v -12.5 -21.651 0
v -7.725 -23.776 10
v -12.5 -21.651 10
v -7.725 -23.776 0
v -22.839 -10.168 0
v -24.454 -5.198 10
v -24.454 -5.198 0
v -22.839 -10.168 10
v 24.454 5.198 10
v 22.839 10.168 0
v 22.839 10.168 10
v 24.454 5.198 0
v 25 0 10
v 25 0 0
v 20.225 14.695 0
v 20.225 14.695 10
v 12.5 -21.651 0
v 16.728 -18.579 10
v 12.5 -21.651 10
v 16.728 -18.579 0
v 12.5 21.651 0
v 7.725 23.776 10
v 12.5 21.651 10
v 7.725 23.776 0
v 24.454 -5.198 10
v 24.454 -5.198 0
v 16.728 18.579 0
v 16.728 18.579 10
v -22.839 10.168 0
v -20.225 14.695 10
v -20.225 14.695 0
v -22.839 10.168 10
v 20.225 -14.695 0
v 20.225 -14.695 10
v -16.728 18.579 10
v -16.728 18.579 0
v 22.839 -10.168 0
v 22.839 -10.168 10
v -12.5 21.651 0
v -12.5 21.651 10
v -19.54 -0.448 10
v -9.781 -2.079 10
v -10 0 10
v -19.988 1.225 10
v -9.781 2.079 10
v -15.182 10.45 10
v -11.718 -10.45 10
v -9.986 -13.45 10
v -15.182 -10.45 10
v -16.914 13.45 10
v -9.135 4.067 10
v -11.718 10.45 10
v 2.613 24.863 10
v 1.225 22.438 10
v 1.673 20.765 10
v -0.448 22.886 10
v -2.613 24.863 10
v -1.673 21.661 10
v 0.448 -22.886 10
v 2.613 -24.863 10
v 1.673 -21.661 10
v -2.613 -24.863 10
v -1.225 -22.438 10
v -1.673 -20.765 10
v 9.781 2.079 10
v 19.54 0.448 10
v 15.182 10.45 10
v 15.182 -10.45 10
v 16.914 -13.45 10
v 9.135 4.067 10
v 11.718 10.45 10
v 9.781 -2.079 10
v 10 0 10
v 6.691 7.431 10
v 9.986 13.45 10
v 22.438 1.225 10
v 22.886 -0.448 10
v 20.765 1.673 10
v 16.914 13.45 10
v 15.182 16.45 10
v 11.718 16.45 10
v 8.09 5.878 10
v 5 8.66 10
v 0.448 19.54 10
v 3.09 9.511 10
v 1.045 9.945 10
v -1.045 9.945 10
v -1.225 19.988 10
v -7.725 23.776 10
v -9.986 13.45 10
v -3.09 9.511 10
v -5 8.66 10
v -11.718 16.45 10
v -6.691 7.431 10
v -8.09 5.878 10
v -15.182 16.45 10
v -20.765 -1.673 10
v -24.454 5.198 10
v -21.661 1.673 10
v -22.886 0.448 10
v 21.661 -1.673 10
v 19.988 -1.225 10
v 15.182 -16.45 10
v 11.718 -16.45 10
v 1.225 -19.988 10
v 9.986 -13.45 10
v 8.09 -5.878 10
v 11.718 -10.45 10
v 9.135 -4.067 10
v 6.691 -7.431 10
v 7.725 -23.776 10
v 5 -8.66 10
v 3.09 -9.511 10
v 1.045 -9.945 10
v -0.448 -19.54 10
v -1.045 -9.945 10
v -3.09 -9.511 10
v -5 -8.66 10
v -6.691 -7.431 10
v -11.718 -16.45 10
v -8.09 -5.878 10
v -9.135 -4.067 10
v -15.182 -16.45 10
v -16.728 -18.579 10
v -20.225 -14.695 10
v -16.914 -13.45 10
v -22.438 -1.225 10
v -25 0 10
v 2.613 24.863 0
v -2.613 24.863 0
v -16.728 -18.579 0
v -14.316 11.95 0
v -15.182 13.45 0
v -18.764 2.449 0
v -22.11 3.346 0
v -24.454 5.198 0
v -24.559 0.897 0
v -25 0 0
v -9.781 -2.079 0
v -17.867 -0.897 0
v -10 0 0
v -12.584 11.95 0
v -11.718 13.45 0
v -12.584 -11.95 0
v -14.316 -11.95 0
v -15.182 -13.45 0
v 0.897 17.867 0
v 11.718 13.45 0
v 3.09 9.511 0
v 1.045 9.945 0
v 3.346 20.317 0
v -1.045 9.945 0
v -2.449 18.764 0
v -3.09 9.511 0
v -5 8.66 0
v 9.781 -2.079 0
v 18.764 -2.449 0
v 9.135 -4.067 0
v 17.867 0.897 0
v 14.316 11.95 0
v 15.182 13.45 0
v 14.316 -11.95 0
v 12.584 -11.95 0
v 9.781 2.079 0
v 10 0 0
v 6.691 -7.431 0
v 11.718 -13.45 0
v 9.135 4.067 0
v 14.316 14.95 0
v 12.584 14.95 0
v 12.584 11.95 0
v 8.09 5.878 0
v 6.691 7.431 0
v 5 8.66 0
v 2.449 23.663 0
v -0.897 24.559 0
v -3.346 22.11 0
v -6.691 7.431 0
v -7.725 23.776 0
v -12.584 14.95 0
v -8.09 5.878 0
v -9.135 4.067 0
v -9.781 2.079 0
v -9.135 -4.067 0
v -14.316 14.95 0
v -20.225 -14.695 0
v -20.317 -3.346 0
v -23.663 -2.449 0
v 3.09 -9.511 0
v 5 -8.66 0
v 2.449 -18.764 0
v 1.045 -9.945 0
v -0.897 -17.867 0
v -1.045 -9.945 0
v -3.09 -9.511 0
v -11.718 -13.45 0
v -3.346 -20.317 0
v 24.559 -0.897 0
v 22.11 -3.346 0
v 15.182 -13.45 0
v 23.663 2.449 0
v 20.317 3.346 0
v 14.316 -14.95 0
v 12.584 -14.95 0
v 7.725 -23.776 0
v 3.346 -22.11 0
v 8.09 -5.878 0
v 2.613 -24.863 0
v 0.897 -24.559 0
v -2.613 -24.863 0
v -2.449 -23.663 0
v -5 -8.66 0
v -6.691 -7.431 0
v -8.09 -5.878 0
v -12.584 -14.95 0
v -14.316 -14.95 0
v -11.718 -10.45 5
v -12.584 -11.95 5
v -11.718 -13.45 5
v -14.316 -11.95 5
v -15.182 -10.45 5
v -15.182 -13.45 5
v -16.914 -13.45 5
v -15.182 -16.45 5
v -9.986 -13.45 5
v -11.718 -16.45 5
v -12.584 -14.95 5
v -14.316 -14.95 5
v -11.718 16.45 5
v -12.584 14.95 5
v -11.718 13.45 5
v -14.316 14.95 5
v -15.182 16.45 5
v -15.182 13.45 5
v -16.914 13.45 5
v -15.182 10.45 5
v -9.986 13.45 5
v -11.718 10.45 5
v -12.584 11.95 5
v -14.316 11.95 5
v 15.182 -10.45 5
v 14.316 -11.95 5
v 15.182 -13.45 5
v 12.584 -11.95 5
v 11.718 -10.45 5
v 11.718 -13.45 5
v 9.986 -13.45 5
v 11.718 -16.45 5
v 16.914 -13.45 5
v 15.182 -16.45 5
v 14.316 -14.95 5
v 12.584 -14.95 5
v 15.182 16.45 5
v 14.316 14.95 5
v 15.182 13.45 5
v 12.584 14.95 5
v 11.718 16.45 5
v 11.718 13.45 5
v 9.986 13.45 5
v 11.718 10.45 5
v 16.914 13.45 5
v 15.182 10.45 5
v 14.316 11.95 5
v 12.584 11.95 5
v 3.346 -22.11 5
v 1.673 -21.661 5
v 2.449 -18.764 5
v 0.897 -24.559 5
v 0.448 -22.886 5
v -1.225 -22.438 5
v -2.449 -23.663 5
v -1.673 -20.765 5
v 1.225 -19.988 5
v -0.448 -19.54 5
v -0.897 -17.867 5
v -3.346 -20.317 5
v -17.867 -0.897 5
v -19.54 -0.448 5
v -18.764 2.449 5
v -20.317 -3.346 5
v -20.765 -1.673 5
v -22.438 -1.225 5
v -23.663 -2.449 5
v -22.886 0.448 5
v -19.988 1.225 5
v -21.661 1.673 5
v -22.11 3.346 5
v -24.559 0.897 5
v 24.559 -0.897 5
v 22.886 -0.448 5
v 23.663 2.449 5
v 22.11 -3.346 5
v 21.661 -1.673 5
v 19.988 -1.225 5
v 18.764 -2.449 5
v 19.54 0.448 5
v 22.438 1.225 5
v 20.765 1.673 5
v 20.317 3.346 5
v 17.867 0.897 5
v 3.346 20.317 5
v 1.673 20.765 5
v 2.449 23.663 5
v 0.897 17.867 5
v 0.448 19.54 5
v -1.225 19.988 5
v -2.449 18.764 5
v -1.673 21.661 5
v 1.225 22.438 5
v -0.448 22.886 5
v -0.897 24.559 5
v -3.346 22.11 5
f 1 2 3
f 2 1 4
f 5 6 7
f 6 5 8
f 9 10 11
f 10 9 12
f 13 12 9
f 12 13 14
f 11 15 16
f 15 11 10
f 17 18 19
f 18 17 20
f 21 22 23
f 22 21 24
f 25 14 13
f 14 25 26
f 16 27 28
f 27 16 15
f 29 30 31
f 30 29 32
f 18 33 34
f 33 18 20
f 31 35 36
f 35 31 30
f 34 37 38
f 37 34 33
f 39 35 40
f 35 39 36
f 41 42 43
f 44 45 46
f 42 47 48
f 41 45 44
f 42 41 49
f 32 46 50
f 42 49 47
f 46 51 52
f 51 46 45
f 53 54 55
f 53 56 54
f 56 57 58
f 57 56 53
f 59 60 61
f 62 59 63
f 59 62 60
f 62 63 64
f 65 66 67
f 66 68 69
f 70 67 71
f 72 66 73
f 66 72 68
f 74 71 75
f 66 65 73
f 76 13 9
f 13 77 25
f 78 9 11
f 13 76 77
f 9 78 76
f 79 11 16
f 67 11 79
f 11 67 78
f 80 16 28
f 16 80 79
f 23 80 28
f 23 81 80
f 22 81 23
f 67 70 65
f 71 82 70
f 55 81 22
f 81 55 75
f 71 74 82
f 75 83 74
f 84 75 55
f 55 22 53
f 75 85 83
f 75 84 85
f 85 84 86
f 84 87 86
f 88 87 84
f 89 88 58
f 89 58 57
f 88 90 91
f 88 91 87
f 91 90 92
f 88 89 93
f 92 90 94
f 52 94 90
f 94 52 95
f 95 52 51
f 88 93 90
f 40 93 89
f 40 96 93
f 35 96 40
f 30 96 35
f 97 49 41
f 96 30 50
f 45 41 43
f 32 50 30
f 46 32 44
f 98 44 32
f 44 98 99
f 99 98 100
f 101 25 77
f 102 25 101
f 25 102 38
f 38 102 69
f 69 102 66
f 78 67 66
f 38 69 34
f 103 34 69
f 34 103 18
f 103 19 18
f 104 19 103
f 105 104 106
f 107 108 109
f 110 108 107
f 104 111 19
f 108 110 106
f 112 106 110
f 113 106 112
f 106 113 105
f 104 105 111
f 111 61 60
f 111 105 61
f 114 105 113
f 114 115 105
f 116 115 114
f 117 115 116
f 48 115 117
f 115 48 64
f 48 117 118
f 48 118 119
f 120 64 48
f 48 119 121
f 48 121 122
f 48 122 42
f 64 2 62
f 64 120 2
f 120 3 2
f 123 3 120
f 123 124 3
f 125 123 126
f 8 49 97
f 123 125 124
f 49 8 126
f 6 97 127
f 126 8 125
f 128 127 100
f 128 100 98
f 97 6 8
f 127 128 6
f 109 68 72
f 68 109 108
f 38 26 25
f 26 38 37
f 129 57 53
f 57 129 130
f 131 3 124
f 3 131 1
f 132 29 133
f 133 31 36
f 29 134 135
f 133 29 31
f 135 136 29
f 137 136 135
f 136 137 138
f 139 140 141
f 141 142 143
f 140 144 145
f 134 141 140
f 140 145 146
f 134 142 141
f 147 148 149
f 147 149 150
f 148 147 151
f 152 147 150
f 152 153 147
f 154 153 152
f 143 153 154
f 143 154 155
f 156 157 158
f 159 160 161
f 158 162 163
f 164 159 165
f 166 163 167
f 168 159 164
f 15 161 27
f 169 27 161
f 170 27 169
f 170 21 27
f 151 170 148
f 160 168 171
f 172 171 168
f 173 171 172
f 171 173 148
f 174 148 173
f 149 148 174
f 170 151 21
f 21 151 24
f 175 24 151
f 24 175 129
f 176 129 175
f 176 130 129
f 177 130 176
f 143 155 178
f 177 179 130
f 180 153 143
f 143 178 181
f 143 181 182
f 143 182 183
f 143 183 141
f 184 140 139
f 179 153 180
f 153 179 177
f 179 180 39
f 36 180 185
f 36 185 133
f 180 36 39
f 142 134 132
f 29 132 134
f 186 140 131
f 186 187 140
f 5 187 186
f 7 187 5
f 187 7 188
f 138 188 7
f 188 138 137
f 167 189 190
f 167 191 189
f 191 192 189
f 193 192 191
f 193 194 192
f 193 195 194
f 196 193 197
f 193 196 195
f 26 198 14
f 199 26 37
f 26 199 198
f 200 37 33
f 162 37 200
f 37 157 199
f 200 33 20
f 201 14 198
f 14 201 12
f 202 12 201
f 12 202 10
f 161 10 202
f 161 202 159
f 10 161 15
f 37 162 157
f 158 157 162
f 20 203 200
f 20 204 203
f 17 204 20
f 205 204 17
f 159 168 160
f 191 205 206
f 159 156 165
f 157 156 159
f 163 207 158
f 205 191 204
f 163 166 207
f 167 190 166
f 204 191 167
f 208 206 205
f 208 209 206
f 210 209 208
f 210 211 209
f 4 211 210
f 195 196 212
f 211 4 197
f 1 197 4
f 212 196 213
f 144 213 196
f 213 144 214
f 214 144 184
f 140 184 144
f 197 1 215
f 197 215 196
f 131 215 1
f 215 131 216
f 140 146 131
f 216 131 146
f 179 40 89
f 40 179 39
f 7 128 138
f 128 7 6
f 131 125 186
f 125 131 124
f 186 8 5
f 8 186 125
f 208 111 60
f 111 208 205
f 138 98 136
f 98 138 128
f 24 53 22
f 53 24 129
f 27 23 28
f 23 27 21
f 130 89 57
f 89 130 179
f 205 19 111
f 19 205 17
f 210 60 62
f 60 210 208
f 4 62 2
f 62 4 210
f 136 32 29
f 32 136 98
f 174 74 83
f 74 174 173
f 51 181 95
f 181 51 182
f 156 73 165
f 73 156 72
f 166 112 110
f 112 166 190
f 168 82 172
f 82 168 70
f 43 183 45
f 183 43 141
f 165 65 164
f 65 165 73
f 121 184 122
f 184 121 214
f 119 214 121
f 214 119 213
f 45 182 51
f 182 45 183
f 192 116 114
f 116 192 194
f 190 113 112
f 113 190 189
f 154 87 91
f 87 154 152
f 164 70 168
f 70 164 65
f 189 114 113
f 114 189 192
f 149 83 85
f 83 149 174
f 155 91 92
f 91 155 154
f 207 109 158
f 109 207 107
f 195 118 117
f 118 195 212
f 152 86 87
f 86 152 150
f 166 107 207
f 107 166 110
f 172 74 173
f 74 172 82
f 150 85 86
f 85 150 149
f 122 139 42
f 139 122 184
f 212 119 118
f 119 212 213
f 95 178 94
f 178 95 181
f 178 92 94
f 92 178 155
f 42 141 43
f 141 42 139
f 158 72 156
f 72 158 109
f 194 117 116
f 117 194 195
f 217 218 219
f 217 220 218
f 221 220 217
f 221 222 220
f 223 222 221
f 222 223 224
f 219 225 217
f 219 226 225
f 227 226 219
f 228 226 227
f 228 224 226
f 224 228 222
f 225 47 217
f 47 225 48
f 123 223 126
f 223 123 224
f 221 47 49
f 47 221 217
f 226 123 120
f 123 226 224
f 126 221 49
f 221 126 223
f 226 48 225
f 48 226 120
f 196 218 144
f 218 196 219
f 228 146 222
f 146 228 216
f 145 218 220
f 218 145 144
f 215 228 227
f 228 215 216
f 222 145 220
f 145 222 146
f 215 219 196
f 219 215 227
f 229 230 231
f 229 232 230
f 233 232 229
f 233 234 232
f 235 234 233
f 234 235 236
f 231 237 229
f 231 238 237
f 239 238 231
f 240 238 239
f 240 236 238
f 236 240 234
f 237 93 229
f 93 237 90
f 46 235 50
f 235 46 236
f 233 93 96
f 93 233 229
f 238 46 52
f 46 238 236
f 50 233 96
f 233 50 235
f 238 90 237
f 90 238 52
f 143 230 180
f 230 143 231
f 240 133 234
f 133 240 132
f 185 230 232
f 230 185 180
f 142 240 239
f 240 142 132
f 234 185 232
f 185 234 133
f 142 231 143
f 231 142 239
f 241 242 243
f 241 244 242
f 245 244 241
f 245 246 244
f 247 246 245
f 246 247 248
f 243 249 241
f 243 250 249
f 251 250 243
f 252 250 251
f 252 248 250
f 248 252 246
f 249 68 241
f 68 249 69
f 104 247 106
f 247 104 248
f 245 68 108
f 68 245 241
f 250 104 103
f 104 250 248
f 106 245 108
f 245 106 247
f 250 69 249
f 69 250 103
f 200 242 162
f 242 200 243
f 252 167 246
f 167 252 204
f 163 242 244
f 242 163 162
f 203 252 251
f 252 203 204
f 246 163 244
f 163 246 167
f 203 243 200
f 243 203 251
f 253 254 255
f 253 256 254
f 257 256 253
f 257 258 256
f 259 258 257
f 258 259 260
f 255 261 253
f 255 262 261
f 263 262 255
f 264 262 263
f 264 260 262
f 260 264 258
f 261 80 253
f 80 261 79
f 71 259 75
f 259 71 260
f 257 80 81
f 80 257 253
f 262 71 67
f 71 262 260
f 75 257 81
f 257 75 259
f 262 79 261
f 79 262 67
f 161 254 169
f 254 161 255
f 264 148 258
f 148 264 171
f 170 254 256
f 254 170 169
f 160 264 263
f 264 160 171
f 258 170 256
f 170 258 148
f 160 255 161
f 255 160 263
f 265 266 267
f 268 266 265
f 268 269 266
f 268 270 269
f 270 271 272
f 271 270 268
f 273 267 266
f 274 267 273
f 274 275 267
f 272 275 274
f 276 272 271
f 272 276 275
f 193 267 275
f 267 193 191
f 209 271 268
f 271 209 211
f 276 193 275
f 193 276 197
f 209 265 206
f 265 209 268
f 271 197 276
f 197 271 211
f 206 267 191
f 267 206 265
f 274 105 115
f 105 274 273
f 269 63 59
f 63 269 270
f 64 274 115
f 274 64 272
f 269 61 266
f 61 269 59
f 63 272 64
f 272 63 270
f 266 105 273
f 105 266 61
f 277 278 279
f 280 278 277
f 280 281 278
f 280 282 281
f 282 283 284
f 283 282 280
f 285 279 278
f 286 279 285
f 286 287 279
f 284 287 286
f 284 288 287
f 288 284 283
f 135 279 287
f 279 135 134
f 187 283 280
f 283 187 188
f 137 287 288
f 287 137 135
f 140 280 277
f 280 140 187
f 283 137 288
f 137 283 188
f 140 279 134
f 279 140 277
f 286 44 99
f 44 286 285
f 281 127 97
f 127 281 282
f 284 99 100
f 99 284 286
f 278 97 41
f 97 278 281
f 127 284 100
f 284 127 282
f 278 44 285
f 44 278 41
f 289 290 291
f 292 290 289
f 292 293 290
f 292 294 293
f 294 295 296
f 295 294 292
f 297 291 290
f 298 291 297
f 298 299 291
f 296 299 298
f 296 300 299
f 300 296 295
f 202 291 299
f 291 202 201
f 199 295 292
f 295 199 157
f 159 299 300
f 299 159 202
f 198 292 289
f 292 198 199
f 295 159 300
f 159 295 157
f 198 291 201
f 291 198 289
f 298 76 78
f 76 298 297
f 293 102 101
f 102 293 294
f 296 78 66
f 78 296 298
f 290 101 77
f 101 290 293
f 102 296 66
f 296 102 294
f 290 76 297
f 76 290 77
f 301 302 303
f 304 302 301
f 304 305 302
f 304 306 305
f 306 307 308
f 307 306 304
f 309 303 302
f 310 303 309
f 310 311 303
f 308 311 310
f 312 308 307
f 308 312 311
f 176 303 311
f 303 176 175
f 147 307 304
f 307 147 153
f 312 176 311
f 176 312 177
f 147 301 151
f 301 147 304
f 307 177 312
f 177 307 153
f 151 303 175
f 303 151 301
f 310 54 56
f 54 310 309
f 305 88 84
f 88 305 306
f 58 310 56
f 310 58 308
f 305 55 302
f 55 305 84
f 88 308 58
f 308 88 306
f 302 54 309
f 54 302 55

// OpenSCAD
/*
 This creates a size a to size b ring adapter for interoperation of cage parts of different sizes or from different manufacturers
 Counterbores are assumed to be for M3 or 4-40 screws and Rod A counterbores will be easier to print (Rod B counterbores may need supports)
  */

Plate_Thickness = 10;

Outer_Diameter = 50;

//(0 = no thru hole)
Inner_Diameter = 20;

Rod_A_Diameter = 6;

Rod_A_Spacing = 26.9;

Rod_A_Hole_Type = "Counterbore";	//	[Thru, Counterbore]

Rod_B_Diameter = 6;

Rod_B_Spacing = 30;

Rod_B_Hole_Type = "Counterbore";	//	[Thru, Counterbore]

Relative_Angle= 45;//	[0:90]
difference(){
    make_plate ();
    make_rod_a_hole();
    make_rod_b_hole();
}

module make_plate (){
    if (Inner_Diameter == 0) cylinder(h = Plate_Thickness, r = Outer_Diameter/2, Center = false);
    else difference(){
        cylinder(h = Plate_Thickness, r = Outer_Diameter/2, Center = false);
        cylinder(h = Plate_Thickness, r = Inner_Diameter/2, Center = false);
    }
}
module make_rod_a_hole (){
    if (Rod_A_Hole_Type == "Thru")
    { 
        for (x = [-.5,.5], 
        y =[-.5,.5]) translate ([x*Rod_A_Spacing,y*Rod_A_Spacing,Plate_Thickness/2]) make_hex(Rod_A_Diameter,Plate_Thickness);
    }
    else
    { 
        for (x = [-.5,.5], 
        y =[-.5,.5]) translate ([x*Rod_A_Spacing,y*Rod_A_Spacing,Plate_Thickness/4]) make_counter(Rod_A_Diameter,Plate_Thickness);
    }
    
}
module make_rod_b_hole (){
    if (Rod_B_Hole_Type == "Thru")
    { 
        for (x = [-.5,.5], 
        y =[-.5,.5]) rotate([0,0,Relative_Angle]) translate ([x*Rod_B_Spacing,y*Rod_B_Spacing,Plate_Thickness/2]) make_hex(Rod_B_Diameter,Plate_Thickness);
    }
    else
    { 
        for (x = [-.5,.5], 
        y =[-.5,.5]) rotate([0,0,Relative_Angle])translate ([x*Rod_B_Spacing,y*Rod_B_Spacing,3*Plate_Thickness/4])mirror([0,0,1]) make_counter(Rod_B_Diameter,Plate_Thickness);
    }
    
}
module make_hex(Diam,Len){
    s =Diam/2 * ( 2 * tan(30));
        for (r = [-60,0,60]) rotate([0,0,r]) cube([s, Diam, Len], true);
            }
module make_counter(Diam,Len){
            union(){
            translate ([0,0,Len/2]) make_hex(Diam,Len/2);
            make_hex(3,Len/2);
        }
    }
